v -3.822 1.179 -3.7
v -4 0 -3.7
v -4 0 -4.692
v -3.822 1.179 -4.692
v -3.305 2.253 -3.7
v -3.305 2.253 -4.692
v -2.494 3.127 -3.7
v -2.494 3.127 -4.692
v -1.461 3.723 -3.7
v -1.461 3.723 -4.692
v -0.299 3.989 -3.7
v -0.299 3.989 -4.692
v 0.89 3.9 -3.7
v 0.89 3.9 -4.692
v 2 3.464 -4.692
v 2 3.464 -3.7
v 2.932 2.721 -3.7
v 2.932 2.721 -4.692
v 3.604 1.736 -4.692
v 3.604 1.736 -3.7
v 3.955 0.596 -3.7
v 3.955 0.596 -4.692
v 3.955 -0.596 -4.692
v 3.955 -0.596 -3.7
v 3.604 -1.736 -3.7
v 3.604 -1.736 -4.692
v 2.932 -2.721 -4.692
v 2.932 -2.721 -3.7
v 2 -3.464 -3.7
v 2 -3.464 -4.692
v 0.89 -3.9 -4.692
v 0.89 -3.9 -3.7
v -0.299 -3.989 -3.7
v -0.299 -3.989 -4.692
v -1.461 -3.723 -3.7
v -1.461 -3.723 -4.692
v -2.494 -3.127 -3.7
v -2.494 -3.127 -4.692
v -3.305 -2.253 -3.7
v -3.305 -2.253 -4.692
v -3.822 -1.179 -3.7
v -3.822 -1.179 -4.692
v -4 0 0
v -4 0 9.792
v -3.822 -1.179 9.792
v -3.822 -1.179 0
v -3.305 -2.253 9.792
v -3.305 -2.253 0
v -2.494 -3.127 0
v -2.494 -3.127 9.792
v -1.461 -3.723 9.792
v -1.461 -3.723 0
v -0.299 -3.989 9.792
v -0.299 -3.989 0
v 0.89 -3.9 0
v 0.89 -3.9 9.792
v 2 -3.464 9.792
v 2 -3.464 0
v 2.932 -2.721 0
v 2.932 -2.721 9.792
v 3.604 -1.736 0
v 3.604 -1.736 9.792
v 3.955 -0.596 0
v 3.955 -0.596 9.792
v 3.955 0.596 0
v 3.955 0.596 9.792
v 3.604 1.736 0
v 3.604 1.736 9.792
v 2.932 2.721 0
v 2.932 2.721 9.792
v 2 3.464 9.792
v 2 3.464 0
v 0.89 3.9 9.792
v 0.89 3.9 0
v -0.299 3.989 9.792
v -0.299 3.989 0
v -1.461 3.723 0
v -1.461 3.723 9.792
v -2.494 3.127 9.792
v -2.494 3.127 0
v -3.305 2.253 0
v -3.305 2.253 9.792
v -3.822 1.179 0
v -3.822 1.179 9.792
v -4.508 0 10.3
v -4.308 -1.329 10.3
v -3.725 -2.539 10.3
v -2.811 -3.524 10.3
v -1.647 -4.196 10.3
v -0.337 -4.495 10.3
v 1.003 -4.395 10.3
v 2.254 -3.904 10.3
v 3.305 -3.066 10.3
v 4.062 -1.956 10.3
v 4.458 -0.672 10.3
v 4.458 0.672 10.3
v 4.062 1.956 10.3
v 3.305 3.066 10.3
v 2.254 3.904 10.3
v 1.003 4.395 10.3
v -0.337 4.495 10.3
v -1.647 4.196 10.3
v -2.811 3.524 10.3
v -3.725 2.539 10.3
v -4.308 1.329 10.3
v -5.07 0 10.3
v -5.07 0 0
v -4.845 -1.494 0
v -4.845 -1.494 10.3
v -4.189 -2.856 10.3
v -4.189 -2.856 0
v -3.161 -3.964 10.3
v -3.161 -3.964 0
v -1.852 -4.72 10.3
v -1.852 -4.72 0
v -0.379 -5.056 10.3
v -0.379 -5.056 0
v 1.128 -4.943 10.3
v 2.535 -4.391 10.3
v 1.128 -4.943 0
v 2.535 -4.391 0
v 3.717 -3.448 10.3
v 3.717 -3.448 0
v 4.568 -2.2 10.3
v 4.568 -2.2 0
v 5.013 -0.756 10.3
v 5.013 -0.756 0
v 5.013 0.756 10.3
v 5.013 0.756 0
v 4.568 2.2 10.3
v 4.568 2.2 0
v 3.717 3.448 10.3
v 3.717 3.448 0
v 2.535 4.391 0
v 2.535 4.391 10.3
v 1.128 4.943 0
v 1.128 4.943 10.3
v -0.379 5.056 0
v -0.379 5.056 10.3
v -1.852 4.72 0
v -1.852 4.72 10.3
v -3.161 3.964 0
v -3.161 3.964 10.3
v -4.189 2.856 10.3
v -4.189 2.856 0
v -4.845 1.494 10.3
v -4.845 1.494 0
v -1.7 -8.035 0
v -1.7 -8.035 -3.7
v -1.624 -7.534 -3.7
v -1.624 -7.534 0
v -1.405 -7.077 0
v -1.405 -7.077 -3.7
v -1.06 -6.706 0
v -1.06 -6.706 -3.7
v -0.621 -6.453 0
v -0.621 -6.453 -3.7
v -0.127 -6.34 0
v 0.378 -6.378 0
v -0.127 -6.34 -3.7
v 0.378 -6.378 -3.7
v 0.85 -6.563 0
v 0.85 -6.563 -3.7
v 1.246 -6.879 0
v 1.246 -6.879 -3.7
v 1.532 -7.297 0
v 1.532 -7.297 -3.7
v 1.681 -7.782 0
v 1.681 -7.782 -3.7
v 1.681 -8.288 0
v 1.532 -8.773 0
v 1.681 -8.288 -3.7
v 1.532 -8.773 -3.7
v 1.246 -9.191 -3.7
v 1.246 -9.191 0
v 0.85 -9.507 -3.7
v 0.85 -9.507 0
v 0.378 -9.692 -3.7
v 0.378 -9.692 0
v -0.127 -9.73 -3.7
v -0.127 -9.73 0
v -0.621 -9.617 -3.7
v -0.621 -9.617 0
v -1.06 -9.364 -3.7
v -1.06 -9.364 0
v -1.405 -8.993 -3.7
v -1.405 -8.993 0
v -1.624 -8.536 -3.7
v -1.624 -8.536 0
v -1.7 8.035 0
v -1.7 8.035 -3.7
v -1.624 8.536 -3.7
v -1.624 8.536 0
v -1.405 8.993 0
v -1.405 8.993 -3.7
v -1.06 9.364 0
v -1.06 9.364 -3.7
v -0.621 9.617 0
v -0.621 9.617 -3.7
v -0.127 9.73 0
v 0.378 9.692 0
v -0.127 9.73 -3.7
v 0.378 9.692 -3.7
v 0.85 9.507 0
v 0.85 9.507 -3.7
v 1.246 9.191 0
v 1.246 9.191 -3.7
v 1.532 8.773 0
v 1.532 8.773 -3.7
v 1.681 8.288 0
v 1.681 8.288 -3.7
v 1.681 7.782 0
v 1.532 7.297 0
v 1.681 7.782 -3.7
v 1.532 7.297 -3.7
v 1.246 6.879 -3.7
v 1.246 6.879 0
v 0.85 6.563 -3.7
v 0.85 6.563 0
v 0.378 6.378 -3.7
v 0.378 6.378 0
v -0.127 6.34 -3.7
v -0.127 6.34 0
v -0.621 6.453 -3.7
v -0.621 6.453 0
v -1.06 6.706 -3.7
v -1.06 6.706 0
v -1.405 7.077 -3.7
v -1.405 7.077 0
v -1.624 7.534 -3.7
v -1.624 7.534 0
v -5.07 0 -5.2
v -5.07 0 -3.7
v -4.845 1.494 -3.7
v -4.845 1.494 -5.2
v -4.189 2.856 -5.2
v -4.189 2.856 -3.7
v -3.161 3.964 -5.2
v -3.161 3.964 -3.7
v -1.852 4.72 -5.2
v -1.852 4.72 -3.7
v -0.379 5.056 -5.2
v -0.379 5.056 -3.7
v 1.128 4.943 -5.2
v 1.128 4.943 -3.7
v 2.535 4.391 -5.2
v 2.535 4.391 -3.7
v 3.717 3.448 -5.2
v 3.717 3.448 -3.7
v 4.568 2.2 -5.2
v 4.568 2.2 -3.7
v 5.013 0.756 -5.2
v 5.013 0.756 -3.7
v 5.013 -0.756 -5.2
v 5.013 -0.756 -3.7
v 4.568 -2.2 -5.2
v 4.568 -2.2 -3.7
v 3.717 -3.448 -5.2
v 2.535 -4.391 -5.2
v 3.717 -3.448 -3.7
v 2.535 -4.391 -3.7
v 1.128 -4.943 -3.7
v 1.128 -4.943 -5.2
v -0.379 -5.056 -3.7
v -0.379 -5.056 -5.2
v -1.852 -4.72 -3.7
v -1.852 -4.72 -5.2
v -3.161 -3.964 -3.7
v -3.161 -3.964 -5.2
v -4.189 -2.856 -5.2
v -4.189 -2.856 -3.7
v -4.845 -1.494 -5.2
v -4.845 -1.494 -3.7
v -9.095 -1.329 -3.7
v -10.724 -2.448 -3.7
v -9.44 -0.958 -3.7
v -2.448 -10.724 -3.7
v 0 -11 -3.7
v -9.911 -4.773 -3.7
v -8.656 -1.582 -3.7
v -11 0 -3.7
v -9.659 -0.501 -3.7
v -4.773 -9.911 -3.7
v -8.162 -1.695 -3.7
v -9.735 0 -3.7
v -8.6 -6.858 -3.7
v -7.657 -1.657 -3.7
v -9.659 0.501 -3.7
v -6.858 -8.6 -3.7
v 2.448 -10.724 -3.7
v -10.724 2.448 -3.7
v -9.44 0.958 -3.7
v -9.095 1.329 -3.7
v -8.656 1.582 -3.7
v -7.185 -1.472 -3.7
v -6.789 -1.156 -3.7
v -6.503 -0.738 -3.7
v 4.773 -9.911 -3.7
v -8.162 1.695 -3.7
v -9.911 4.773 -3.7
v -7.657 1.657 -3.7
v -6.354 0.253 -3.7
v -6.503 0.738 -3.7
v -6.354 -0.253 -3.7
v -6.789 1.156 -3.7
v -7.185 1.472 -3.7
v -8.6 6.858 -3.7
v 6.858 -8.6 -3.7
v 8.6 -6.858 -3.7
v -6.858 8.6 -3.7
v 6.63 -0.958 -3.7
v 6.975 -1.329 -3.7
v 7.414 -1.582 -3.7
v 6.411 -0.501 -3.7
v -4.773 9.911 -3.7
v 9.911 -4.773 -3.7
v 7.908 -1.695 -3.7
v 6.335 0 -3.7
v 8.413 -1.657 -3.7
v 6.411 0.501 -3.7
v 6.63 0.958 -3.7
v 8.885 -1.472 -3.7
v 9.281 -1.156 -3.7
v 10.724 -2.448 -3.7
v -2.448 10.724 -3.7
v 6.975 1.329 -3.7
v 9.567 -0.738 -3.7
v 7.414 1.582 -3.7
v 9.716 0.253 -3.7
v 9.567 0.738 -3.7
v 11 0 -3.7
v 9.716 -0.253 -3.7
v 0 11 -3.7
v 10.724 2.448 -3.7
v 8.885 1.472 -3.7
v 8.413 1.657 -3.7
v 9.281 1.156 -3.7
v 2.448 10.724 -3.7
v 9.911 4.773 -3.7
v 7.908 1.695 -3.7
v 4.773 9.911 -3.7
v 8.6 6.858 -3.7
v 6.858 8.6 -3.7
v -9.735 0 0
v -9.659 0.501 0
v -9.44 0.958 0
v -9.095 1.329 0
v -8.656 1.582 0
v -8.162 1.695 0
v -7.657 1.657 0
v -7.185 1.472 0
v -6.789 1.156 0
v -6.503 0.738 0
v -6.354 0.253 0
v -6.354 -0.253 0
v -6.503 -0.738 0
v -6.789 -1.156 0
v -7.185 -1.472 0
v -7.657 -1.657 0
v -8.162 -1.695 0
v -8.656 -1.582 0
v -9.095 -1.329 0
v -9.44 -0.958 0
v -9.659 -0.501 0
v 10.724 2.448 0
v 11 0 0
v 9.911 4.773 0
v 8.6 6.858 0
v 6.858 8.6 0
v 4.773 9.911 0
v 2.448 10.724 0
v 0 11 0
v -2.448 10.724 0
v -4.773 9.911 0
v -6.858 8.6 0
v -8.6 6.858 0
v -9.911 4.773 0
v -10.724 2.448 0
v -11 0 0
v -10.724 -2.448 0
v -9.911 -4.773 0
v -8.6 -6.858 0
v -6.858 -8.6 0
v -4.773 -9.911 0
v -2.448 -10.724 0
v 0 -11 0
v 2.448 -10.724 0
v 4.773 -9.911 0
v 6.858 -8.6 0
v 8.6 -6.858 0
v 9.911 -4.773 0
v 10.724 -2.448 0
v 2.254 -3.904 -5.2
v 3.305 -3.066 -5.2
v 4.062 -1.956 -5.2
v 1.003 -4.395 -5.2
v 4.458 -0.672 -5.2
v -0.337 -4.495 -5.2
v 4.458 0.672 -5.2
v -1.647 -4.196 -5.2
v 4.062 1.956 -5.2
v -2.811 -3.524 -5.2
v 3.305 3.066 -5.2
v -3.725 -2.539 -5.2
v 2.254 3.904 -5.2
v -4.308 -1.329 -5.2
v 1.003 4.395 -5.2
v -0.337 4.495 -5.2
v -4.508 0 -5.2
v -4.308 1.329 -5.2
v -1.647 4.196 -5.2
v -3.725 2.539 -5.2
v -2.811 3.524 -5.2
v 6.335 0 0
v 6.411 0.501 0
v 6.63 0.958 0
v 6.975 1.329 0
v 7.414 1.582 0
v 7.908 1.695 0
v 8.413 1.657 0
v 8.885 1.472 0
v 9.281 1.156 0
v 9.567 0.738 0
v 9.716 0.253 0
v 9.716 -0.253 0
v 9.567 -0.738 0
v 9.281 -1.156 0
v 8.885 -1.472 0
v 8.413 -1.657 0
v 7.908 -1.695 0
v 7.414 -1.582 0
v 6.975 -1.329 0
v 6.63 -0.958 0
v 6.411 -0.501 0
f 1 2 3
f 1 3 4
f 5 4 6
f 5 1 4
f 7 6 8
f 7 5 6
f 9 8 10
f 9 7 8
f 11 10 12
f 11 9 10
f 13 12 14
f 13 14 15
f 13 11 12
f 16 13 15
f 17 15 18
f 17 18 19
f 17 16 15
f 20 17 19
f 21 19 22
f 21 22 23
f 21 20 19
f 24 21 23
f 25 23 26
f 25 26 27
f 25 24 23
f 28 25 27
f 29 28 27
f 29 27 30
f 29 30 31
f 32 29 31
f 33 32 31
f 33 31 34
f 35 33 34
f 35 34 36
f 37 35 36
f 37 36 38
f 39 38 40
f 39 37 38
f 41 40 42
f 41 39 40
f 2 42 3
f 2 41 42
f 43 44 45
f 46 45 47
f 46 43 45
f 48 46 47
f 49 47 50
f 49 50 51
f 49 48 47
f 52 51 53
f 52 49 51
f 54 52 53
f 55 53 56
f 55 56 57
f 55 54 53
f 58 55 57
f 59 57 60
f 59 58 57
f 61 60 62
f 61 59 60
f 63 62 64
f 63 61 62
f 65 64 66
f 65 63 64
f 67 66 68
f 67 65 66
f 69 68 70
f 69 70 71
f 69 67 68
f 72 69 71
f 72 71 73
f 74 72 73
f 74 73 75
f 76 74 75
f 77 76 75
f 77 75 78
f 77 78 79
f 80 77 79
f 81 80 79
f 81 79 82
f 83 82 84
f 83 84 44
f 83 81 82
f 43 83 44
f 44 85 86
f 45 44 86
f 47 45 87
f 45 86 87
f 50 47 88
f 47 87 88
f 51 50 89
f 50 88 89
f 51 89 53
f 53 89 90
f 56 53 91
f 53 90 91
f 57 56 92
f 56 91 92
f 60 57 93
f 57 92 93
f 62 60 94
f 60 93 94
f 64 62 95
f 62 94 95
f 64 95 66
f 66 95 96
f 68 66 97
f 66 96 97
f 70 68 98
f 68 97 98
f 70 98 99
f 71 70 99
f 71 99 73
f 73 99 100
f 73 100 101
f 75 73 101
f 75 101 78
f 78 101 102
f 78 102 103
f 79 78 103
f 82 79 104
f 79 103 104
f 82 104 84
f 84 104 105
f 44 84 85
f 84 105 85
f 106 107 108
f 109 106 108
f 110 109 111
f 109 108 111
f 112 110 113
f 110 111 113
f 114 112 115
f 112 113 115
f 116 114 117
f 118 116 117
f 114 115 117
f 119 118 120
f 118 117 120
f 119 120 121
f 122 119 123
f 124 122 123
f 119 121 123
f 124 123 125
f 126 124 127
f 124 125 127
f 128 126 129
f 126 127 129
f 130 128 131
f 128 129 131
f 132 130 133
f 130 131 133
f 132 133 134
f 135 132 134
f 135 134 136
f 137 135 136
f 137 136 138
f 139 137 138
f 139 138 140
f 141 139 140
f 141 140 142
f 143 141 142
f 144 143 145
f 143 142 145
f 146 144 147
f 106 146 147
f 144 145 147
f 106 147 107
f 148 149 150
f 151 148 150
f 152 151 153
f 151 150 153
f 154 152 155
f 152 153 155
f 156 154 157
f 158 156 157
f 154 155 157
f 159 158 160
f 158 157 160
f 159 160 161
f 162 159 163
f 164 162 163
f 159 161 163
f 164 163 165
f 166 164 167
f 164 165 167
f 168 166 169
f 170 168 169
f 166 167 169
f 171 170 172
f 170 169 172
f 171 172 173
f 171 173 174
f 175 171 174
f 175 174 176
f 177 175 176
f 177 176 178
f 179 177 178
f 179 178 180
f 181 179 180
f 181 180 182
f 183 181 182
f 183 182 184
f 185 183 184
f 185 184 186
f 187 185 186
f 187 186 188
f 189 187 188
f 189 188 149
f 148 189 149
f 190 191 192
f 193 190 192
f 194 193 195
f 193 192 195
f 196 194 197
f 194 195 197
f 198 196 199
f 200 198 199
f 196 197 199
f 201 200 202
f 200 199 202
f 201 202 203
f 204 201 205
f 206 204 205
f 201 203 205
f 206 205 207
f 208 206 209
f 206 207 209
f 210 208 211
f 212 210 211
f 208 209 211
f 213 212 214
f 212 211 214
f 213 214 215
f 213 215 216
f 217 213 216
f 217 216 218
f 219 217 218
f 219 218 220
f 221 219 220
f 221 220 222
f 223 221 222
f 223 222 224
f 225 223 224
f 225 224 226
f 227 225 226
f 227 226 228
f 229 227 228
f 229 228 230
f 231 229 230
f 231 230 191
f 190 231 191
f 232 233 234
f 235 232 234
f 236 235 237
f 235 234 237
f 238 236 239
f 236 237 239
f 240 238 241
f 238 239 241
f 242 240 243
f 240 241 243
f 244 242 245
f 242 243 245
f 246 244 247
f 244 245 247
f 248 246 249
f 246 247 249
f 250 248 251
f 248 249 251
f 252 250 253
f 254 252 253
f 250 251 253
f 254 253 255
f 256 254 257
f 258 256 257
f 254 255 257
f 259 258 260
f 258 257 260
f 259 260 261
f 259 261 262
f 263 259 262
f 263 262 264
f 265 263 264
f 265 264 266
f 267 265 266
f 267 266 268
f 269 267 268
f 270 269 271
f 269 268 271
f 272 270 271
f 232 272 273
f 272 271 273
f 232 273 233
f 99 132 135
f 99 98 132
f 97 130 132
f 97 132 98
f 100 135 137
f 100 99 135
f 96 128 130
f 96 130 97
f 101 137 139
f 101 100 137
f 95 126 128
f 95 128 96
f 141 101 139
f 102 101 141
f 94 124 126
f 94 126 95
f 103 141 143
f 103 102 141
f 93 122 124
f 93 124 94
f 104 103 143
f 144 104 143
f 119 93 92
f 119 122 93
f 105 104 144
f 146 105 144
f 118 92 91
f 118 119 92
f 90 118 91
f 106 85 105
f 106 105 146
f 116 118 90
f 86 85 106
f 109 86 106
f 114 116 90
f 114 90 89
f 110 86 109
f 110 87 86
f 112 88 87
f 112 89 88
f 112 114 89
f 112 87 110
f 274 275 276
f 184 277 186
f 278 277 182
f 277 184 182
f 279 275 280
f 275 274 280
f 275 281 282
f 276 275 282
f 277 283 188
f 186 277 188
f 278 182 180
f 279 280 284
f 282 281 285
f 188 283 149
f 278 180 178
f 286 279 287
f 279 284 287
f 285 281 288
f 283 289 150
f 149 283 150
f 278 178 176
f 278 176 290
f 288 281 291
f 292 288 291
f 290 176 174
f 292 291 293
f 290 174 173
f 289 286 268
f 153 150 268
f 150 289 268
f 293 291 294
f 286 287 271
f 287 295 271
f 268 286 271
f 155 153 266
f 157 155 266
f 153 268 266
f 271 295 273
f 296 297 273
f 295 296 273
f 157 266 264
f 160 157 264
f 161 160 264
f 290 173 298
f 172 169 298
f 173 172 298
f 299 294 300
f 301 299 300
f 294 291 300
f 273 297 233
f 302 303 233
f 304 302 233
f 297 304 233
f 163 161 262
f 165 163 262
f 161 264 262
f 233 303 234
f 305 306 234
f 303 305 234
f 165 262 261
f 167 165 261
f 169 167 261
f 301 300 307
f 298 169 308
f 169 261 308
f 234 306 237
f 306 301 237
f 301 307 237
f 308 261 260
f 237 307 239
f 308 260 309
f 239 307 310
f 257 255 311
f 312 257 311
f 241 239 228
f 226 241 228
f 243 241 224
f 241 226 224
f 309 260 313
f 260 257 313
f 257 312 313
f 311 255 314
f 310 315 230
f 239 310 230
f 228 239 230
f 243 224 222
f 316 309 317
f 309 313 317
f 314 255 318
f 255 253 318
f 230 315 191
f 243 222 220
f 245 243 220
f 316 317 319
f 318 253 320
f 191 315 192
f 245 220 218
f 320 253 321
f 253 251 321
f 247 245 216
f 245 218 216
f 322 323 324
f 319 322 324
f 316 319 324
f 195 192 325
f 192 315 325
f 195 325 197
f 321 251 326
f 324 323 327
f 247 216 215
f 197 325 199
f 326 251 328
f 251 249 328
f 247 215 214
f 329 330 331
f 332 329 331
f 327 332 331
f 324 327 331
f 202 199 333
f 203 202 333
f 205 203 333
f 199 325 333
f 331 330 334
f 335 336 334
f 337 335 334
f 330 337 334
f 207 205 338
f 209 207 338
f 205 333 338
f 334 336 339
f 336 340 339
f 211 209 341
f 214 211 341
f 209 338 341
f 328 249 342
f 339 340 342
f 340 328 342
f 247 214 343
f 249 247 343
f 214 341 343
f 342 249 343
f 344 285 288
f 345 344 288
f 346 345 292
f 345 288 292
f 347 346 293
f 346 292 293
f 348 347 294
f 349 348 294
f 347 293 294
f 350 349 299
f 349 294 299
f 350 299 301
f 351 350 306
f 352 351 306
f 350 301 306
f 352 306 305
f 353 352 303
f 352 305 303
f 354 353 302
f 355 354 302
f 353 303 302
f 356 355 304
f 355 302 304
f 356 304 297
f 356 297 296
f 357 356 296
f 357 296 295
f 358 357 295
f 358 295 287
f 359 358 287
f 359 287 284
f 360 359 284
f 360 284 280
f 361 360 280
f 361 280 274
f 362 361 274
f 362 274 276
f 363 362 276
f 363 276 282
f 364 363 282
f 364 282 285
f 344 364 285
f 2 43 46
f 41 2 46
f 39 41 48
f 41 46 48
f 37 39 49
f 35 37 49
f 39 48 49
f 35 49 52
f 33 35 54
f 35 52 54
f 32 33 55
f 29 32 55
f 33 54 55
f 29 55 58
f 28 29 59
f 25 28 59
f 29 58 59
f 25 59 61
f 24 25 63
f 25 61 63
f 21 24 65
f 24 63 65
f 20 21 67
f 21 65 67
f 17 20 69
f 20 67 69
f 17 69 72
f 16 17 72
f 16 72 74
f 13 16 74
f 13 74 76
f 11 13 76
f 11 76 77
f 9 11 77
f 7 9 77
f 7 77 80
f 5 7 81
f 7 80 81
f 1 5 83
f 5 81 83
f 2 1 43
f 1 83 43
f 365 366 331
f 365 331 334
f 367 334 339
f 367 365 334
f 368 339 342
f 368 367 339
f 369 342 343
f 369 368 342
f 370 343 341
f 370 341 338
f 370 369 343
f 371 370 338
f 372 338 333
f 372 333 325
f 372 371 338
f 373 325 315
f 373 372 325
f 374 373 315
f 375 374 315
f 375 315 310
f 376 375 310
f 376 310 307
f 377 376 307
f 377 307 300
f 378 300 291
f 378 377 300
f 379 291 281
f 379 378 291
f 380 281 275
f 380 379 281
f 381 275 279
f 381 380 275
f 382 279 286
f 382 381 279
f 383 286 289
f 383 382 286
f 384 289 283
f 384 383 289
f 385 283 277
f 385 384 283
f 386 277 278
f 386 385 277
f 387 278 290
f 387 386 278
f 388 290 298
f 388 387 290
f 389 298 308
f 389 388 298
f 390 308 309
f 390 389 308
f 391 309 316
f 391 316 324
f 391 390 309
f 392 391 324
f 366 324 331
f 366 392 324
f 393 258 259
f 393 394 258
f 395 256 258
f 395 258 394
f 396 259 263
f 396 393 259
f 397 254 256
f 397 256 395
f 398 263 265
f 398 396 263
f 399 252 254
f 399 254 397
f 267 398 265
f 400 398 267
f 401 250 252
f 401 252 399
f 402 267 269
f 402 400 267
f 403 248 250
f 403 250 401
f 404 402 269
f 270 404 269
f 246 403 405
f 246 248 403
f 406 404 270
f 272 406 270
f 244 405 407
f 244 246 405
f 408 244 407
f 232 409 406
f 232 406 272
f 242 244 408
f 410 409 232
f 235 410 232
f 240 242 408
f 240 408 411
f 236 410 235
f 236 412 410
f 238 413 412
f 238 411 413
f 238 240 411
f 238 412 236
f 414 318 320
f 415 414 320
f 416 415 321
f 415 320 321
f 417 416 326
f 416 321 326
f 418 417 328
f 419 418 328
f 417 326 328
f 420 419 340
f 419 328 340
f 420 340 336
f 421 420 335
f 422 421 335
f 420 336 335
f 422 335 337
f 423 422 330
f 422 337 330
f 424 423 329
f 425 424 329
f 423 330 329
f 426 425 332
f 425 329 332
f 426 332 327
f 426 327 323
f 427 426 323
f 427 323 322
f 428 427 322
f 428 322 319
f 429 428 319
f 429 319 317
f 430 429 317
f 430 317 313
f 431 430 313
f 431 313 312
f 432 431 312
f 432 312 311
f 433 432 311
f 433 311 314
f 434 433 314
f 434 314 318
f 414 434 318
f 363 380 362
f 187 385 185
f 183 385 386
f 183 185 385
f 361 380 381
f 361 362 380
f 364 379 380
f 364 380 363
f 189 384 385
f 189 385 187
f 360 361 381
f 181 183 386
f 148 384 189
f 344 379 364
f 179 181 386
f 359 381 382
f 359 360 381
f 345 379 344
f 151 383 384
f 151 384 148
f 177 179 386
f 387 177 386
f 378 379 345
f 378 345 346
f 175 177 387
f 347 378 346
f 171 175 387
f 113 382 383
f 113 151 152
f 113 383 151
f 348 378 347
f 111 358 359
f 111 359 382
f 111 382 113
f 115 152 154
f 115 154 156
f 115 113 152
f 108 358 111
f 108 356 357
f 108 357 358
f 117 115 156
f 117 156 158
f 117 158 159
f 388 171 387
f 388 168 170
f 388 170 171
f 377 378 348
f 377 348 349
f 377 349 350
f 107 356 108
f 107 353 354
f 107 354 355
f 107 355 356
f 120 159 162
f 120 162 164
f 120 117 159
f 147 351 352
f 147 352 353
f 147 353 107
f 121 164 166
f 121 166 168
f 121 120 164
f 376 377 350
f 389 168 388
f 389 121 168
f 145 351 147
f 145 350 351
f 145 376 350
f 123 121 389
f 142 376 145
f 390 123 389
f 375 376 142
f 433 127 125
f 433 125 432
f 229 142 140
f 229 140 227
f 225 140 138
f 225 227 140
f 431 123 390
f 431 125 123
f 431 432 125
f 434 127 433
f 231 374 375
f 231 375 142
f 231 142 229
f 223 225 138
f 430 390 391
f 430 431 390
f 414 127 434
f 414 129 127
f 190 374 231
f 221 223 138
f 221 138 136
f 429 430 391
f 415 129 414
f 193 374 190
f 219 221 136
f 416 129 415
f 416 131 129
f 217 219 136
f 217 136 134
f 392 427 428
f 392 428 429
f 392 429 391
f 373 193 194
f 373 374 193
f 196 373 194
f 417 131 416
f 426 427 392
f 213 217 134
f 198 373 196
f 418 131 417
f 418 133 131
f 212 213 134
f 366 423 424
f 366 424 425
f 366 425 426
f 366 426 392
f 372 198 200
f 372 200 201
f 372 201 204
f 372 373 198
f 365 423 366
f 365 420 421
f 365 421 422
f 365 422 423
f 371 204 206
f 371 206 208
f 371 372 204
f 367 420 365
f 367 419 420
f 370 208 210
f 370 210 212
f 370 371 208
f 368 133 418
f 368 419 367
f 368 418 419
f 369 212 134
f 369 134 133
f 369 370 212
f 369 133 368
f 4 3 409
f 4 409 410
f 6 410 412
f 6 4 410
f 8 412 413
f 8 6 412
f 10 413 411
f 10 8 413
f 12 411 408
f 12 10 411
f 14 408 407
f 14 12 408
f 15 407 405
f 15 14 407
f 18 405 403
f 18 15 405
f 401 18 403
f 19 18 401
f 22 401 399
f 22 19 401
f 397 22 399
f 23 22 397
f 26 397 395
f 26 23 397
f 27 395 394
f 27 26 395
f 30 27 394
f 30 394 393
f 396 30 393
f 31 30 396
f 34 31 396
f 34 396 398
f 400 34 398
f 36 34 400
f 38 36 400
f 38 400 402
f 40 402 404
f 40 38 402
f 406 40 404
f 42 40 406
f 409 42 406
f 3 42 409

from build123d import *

# Parameters (mm, degrees)
SKETCH1_R           = 5.07
SKETCH1_R_2         = 4
BOSS_EXTRUDE1_DEPTH = 10.3
SKETCH1_3_R         = 11
SKETCH1_3_R_2       = 5.07
SKETCH1_3_R_3       = 4
BOSS_EXTRUDE2_DEPTH = 3.7
SKETCH2_R           = 5.07
SKETCH2_R_2         = 4
BOSS_EXTRUDE3_DEPTH = 1.5
CHAMFER1_SIZE       = 0.508
SKETCH3_R           = 1.7
CUT_EXTRUDE1_DEPTH  = 4.294


with BuildPart() as part:
    # Sketch1 → Boss-Extrude1 (new body)
    with BuildSketch(Plane.XY):
        with Locations(Location((0, 0, 0), (0, 0, 180))):
            Circle(SKETCH1_R)
        with Locations(Location((0, 0, 0), (0, 0, 180))):
            Circle(SKETCH1_R_2, mode=Mode.SUBTRACT)
    extrude(amount=BOSS_EXTRUDE1_DEPTH)

    # Sketch1<3> → Boss-Extrude2 (add)
    with BuildSketch(Plane.XY):
        Circle(SKETCH1_3_R)
        with Locations(Location((0, 0, 0), (0, 0, 180))):
            Circle(SKETCH1_3_R_2, mode=Mode.SUBTRACT)
        with Locations(Location((0, 0, 0), (0, 0, 180))):
            Circle(SKETCH1_3_R_2)
        with Locations(Location((0, 0, 0), (0, 0, 180))):
            Circle(SKETCH1_3_R_3, mode=Mode.SUBTRACT)
    extrude(amount=-BOSS_EXTRUDE2_DEPTH)

    # Sketch2 → Boss-Extrude3 (add)
    with BuildSketch(Plane(origin=(0, 0, -3.7), x_dir=(-1, 0, 0), z_dir=(0, 0, -1))):
        Circle(SKETCH2_R)
        Circle(SKETCH2_R_2, mode=Mode.SUBTRACT)
    extrude(amount=BOSS_EXTRUDE3_DEPTH)

    # Chamfer1
    chamfer1_edges = [part.edges().sort_by_distance(p)[0] for p in [
        (4, 0, -5.2),
        (4, 0, 10.3),
    ]]
    chamfer(chamfer1_edges, length=CHAMFER1_SIZE)

    # Sketch3 → Cut-Extrude1 (cut)
    with BuildSketch(Plane(origin=(0, 0, -3.7), x_dir=(-1, 0, 0), z_dir=(0, 0, -1))):
        with Locations((-8.035, 0)):
            Circle(SKETCH3_R)
        with Locations((0, 8.035)):
            Circle(SKETCH3_R)
        with Locations((8.035, 0)):
            Circle(SKETCH3_R)
        with Locations((0, -8.035)):
            Circle(SKETCH3_R)
    extrude(amount=-CUT_EXTRUDE1_DEPTH, mode=Mode.SUBTRACT)


solid = part.part
